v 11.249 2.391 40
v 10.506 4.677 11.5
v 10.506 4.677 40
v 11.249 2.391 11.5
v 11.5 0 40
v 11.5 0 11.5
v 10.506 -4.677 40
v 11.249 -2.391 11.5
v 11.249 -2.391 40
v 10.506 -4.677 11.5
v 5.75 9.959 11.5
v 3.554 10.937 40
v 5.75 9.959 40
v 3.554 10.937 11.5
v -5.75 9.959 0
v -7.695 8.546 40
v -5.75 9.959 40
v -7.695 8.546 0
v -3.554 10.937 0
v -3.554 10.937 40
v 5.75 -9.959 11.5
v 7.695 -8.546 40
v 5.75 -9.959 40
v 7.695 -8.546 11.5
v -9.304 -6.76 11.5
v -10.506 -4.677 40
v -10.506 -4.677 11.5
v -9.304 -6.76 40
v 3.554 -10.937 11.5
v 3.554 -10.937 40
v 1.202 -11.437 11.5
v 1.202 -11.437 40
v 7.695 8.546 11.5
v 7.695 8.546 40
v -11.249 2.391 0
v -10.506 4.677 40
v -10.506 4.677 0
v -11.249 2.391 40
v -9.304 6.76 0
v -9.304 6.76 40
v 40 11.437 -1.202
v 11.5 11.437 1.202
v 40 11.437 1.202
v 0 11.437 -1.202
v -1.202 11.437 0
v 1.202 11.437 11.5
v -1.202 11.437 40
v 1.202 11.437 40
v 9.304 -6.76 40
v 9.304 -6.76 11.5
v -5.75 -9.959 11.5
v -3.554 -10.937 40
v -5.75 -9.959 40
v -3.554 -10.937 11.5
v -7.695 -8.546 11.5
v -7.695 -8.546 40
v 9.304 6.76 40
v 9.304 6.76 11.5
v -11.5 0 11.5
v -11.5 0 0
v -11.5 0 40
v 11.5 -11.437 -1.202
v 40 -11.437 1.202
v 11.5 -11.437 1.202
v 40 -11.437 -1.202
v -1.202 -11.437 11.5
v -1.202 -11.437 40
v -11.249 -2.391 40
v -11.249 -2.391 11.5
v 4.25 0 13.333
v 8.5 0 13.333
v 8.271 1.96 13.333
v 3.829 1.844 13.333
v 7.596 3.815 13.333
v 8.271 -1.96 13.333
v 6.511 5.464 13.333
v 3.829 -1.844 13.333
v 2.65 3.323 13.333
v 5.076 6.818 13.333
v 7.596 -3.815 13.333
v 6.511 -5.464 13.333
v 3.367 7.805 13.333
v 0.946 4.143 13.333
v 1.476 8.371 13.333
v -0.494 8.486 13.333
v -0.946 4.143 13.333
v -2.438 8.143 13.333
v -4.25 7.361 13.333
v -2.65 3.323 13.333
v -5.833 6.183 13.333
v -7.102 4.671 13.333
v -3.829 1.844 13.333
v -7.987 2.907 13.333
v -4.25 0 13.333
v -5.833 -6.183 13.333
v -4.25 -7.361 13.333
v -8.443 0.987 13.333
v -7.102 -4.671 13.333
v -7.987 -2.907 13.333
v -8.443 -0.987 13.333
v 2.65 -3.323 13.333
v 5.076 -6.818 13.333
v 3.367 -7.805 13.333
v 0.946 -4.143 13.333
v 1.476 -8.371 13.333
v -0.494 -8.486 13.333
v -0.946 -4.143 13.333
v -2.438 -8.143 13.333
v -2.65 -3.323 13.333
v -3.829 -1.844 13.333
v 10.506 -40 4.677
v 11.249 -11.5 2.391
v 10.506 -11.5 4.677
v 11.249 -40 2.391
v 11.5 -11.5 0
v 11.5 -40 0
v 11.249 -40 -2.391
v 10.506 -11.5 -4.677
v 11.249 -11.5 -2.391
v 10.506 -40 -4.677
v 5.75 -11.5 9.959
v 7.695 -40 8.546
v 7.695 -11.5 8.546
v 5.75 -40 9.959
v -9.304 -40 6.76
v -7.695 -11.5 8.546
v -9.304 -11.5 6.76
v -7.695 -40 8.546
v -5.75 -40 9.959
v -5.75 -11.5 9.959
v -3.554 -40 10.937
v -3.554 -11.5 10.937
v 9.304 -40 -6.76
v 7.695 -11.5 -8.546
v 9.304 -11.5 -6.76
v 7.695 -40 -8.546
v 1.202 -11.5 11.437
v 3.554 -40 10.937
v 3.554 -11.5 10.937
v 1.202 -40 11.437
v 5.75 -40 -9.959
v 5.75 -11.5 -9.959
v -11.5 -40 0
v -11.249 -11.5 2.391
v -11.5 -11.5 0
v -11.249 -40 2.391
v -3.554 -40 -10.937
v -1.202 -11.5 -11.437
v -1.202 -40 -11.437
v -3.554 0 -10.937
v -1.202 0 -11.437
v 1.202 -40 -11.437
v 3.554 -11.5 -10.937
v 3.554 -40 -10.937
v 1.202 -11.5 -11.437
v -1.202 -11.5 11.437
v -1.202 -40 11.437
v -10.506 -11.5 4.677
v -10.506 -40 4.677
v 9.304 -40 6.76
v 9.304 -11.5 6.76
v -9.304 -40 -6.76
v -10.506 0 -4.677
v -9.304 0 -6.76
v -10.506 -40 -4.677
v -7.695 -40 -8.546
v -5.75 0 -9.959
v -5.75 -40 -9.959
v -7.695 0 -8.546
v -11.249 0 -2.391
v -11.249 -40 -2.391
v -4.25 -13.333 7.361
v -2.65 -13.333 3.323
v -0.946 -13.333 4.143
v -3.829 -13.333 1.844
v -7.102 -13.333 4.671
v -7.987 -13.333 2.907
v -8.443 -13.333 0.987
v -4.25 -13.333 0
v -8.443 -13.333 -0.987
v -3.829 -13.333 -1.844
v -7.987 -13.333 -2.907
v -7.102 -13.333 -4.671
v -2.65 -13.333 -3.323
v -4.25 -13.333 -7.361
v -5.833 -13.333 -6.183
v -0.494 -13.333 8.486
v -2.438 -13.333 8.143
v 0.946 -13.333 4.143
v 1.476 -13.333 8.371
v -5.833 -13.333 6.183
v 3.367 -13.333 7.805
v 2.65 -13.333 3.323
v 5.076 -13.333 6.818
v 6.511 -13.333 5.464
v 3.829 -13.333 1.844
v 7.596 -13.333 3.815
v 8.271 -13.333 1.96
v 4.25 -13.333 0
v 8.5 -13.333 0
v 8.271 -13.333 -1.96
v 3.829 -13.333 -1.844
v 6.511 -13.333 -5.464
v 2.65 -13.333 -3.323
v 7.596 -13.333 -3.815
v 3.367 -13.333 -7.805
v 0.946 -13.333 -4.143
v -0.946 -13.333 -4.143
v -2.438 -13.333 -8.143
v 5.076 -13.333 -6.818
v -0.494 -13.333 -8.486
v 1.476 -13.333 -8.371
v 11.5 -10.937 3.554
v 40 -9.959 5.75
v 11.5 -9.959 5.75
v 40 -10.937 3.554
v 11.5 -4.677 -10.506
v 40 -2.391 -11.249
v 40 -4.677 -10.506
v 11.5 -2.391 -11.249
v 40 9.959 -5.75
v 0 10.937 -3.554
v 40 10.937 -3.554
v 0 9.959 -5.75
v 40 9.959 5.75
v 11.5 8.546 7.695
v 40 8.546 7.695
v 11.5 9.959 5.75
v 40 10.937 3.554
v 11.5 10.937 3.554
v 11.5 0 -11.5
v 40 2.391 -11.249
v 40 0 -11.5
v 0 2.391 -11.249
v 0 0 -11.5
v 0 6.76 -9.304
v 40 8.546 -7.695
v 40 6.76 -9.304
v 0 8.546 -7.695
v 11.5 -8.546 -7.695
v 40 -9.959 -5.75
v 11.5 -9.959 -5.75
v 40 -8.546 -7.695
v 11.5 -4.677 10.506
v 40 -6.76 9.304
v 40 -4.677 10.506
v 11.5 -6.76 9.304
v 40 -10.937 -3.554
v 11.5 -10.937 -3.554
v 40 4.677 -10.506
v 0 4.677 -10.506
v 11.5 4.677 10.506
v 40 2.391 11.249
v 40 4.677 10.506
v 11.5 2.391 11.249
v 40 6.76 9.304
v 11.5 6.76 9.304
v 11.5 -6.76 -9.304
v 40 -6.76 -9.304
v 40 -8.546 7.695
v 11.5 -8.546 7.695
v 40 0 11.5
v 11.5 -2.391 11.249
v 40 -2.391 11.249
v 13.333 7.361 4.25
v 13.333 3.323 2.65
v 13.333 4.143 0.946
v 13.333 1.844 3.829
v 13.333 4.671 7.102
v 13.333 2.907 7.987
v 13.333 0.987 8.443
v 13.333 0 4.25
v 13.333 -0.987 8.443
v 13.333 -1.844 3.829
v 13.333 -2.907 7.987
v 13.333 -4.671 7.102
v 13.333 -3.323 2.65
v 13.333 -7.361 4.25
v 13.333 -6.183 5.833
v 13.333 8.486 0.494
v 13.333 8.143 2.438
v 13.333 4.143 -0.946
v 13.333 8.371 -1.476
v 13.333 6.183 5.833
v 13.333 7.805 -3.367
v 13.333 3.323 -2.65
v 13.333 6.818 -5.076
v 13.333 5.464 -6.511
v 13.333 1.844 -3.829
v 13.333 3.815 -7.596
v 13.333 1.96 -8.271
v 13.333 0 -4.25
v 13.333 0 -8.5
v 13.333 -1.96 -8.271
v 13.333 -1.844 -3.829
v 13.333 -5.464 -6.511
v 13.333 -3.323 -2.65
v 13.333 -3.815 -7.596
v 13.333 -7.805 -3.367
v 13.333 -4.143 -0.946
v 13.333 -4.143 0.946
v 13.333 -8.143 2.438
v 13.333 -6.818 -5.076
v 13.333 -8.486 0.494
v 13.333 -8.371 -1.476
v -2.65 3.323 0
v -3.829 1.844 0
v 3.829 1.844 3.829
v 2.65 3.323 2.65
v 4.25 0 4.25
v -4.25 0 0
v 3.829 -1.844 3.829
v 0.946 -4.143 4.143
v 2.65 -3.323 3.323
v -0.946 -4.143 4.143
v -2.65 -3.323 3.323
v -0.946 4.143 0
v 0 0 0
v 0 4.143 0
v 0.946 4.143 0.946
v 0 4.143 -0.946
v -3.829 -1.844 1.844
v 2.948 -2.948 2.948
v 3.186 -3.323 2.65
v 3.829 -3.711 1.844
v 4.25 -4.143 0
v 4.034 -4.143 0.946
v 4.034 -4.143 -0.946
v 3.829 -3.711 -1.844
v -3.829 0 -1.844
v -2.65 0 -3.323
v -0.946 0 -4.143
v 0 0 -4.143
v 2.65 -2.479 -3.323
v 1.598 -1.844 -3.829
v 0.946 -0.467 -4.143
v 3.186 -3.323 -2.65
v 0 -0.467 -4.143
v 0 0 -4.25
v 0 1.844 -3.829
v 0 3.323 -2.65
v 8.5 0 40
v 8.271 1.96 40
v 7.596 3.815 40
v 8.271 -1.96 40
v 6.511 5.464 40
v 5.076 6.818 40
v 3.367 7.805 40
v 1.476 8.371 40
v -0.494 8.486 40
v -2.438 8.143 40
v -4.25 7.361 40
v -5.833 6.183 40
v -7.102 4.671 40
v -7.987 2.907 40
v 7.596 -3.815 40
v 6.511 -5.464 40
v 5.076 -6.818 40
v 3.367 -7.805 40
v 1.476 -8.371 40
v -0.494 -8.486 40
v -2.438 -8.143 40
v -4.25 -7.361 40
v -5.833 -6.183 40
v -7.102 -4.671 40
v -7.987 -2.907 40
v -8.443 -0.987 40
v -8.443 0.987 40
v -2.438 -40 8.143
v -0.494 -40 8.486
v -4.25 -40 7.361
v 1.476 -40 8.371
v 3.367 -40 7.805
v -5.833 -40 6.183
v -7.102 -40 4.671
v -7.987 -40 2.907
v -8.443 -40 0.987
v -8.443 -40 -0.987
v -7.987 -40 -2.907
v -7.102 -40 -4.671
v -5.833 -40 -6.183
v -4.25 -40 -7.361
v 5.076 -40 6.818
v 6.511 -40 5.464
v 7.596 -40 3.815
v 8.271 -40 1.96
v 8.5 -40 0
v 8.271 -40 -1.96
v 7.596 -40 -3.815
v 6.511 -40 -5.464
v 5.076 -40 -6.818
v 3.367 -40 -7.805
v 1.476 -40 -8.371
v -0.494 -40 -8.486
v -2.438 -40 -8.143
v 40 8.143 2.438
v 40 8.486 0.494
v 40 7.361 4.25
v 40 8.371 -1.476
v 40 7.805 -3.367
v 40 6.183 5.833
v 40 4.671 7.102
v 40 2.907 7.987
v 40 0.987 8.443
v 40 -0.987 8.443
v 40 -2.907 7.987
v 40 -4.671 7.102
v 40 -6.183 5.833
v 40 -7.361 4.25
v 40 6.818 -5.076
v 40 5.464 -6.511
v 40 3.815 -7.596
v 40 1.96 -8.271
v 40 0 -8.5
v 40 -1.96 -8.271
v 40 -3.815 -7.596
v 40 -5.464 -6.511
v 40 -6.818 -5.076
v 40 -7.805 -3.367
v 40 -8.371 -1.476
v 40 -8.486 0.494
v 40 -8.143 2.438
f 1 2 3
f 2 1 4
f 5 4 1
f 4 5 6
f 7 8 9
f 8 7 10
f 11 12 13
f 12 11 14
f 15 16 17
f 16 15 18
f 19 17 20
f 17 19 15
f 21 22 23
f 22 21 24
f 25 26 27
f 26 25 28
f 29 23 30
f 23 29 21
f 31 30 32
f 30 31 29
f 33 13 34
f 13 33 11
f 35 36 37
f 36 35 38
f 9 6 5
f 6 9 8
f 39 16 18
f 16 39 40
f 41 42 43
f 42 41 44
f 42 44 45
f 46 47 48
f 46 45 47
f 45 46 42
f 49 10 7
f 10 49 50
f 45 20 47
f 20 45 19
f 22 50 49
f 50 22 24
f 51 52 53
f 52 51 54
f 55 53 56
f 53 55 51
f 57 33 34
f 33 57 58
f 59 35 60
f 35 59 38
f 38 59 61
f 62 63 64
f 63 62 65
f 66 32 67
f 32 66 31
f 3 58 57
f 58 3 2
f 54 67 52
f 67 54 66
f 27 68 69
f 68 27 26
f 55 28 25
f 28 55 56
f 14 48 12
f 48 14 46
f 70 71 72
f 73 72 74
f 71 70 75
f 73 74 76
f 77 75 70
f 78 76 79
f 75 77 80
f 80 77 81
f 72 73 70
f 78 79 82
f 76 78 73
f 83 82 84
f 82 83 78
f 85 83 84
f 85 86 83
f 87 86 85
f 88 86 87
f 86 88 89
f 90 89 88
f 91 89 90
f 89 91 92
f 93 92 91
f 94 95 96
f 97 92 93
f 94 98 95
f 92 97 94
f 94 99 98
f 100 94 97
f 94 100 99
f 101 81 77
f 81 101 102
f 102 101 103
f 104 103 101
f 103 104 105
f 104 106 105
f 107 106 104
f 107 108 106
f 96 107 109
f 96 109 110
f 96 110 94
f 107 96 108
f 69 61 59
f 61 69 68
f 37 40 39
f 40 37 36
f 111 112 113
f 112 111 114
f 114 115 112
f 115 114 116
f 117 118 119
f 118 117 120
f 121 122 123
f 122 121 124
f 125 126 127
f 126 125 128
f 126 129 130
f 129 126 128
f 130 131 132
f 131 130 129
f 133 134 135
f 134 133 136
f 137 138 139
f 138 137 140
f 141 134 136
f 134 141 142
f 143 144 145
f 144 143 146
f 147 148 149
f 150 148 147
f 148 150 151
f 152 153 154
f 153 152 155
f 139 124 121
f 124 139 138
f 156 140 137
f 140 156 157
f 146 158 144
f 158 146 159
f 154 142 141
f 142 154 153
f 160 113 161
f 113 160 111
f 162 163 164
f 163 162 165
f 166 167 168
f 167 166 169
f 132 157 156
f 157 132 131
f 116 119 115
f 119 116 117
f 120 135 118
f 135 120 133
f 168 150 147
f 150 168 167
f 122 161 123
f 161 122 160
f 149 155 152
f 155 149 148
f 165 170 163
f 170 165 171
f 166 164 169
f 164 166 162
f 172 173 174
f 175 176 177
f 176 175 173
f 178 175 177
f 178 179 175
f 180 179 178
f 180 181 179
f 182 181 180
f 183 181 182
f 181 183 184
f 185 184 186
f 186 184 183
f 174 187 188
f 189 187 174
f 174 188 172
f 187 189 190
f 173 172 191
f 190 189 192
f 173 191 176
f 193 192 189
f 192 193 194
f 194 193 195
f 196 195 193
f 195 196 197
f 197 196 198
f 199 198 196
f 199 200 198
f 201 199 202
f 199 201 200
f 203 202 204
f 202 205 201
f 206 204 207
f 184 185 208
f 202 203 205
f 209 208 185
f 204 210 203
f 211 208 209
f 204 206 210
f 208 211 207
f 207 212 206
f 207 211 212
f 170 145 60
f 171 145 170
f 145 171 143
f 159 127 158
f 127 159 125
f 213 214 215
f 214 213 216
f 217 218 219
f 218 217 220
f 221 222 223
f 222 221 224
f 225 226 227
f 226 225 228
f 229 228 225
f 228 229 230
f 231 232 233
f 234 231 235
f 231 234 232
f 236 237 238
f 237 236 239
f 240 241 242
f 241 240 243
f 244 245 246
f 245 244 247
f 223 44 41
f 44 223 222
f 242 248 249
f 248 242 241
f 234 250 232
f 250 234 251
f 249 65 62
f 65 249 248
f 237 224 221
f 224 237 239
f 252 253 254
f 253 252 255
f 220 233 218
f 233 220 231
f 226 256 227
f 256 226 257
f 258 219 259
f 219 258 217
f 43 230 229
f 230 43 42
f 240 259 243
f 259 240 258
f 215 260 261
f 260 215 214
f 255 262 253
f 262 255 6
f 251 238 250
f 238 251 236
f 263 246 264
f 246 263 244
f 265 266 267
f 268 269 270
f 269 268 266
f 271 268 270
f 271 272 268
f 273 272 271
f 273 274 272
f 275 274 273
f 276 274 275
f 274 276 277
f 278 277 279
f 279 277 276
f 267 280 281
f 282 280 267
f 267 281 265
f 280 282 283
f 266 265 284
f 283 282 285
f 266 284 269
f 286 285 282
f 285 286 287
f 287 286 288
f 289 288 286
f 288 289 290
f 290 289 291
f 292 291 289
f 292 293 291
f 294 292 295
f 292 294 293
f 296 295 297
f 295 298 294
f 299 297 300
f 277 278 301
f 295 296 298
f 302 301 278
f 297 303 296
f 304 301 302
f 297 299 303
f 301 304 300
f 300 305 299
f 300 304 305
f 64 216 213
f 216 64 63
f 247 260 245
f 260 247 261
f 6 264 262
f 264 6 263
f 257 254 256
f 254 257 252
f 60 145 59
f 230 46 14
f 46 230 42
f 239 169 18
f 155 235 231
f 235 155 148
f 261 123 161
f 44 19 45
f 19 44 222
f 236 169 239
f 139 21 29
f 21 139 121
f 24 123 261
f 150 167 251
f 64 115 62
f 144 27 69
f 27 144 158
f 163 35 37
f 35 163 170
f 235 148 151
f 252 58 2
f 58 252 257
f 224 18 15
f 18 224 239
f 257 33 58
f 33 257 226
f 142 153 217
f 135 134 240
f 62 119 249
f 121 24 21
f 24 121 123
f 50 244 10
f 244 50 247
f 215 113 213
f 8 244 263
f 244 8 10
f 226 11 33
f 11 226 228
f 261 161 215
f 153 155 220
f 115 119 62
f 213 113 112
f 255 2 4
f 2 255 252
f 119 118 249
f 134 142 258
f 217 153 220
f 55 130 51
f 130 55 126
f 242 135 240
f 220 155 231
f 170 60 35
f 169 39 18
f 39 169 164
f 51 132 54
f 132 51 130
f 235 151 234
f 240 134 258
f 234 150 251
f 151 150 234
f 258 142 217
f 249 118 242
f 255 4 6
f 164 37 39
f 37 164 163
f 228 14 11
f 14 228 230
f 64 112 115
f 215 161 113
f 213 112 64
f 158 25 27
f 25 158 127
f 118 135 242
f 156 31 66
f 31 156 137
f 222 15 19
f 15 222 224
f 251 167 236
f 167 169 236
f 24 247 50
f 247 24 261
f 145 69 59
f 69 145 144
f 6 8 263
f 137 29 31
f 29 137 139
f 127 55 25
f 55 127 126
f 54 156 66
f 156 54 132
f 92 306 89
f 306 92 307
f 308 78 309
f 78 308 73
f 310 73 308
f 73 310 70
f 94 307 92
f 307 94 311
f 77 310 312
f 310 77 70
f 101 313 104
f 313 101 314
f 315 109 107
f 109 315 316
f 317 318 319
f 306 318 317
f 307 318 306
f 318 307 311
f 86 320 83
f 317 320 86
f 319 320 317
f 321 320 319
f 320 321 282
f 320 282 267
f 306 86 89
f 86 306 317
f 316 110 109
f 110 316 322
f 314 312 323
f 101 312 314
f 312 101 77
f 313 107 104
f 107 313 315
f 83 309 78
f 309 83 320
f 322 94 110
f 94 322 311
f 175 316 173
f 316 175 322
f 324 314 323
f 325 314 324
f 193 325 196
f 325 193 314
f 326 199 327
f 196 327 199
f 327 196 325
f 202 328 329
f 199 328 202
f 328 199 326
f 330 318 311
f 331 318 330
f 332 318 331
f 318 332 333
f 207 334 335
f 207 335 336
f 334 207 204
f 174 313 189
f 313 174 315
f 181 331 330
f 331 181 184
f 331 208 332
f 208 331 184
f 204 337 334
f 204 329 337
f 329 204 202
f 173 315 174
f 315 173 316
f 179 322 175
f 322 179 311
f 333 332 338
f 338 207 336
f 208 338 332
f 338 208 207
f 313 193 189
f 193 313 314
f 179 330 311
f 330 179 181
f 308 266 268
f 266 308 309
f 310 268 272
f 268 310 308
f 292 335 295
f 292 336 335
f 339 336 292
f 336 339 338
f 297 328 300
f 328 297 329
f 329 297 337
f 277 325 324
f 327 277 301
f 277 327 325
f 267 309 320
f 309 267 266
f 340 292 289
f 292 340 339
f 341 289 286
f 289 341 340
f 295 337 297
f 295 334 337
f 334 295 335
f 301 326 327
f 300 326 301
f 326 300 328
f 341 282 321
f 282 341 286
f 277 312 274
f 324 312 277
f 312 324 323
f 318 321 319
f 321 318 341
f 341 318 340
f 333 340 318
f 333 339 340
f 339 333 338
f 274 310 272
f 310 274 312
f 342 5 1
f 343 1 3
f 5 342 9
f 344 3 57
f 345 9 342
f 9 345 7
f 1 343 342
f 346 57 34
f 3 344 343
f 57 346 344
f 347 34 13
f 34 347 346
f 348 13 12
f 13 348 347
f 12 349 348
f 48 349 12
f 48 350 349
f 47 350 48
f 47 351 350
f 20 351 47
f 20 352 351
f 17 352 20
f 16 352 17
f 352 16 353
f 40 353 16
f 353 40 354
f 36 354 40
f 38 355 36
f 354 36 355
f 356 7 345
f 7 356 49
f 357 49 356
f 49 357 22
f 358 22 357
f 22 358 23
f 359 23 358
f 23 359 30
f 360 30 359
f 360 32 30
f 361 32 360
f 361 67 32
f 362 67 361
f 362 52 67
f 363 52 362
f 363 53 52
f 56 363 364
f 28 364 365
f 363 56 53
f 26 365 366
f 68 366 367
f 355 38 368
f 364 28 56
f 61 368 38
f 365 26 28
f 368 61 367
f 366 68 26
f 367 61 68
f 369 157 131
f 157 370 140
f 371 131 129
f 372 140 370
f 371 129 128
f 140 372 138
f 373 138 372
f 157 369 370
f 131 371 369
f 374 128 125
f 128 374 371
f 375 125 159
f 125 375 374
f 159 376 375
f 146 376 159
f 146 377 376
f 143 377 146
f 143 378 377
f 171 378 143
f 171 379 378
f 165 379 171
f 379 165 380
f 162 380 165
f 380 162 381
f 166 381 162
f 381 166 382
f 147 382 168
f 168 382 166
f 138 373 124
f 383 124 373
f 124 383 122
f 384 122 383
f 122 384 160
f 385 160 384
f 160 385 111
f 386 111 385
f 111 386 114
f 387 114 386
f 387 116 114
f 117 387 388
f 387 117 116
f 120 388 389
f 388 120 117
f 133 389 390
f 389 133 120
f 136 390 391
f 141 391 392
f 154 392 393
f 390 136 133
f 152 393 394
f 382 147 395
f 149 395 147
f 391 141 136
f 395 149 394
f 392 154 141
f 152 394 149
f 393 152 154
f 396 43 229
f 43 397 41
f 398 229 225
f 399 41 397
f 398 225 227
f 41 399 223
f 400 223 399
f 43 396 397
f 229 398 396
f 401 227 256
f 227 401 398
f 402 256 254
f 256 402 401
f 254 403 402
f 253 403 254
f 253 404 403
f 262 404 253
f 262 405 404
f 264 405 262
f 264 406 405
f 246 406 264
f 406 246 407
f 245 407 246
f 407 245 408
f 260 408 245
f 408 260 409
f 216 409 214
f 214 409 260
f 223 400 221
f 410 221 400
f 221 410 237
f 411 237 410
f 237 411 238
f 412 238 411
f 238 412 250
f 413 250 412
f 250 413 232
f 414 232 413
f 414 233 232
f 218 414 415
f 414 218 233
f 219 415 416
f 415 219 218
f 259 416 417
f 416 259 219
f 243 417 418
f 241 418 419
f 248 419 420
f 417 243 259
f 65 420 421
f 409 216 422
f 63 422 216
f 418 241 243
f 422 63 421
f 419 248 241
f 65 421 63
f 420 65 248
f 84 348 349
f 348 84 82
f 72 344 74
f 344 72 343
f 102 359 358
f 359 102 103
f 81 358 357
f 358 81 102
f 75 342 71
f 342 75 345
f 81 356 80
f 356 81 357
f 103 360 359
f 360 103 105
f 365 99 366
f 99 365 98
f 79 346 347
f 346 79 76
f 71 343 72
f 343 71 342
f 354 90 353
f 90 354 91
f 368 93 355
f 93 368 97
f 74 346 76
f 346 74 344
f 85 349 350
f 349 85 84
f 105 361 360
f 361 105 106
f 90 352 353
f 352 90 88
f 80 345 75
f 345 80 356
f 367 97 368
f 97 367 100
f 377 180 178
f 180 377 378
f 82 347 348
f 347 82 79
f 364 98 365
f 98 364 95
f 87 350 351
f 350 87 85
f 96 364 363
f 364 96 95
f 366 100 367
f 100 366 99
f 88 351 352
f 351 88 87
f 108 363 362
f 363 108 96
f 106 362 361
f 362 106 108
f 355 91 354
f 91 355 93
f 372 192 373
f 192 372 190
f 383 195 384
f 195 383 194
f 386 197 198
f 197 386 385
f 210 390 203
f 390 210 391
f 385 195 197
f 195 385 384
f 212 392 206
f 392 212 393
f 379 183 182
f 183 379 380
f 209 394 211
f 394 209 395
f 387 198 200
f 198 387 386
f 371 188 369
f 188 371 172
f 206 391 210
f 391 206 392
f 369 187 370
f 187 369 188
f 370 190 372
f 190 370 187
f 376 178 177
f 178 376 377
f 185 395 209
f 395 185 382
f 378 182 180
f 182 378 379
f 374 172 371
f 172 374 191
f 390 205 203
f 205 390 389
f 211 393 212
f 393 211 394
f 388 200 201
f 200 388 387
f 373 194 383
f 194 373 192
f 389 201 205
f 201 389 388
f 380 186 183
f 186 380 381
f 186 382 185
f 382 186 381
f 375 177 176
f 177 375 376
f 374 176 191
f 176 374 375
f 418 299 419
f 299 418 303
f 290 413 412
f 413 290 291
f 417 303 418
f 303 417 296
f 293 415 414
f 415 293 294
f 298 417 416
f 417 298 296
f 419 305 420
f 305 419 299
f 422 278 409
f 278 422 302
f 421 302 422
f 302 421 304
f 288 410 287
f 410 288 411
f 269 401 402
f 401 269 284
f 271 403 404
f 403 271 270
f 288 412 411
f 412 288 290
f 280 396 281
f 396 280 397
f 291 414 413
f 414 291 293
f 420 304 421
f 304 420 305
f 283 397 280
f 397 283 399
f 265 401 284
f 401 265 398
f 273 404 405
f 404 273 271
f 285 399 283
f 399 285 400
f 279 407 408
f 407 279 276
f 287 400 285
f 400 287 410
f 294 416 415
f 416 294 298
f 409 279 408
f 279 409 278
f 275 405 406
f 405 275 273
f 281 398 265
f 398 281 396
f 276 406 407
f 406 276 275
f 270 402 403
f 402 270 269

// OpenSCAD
// file: three-way-connector.scad
module three_way_connector(diameter, thickness, length, x_y_angle)
{
	outer_radius = (diameter + (thickness * 2)) / 2;
	inner_radius = outer_radius - thickness;

	union() {
		difference() {
			union() {
			    // Outer cylinders
			    translate(0,0,length-diameter/2) cylinder(r = outer_radius, h = length , center = false);
				rotate([x_y_angle, 0, 0]) cylinder(r = outer_radius, h = length, center = false);
				rotate([0, 90, 0]) cylinder(r = outer_radius, h = length, center = false);

				//This is just to cover the gap in the corner in a tidy way
				hull(){
				     translate(0,0,length-diameter/2) cylinder(r = outer_radius, h = outer_radius , center = false);
                     rotate([x_y_angle, 0, 0]) cylinder(r = outer_radius, h = outer_radius, center = false);
                     rotate([0, 90, 0]) cylinder(r = outer_radius, h = outer_radius, center = false);
				}
			}

            // Inner cylinders - to hollow out the outer ones
			translate(0,0,length-diameter/2-1) cylinder(r = inner_radius, h = (length * 2 + 3), center = false);
			rotate([x_y_angle, 0, 0]) cylinder(r = inner_radius, h = (length + 1), center = false);
			rotate([0, 90, 0]) cylinder(r = inner_radius, h = (length + 1), center = false);
		}
	}
}

three_way_connector(17, 3, 40, 90);
// main file
use <three-way-connector.scad>;

module three_way_connector_with_stops(diameter, thickness, length)
{
    outer_shell_diameter = diameter + (thickness * 2);
    stop_diameter = (diameter / 2);
    stop_thickness = (outer_shell_diameter - stop_diameter) / 2;

    union() {
        // Inner stops
        three_way_connector(stop_diameter, stop_thickness, length / 3, 90);
        // Connector hull
        three_way_connector(diameter, thickness, length,90);
    }
}

three_way_connector_with_stops(17, 3, 40, 90);
